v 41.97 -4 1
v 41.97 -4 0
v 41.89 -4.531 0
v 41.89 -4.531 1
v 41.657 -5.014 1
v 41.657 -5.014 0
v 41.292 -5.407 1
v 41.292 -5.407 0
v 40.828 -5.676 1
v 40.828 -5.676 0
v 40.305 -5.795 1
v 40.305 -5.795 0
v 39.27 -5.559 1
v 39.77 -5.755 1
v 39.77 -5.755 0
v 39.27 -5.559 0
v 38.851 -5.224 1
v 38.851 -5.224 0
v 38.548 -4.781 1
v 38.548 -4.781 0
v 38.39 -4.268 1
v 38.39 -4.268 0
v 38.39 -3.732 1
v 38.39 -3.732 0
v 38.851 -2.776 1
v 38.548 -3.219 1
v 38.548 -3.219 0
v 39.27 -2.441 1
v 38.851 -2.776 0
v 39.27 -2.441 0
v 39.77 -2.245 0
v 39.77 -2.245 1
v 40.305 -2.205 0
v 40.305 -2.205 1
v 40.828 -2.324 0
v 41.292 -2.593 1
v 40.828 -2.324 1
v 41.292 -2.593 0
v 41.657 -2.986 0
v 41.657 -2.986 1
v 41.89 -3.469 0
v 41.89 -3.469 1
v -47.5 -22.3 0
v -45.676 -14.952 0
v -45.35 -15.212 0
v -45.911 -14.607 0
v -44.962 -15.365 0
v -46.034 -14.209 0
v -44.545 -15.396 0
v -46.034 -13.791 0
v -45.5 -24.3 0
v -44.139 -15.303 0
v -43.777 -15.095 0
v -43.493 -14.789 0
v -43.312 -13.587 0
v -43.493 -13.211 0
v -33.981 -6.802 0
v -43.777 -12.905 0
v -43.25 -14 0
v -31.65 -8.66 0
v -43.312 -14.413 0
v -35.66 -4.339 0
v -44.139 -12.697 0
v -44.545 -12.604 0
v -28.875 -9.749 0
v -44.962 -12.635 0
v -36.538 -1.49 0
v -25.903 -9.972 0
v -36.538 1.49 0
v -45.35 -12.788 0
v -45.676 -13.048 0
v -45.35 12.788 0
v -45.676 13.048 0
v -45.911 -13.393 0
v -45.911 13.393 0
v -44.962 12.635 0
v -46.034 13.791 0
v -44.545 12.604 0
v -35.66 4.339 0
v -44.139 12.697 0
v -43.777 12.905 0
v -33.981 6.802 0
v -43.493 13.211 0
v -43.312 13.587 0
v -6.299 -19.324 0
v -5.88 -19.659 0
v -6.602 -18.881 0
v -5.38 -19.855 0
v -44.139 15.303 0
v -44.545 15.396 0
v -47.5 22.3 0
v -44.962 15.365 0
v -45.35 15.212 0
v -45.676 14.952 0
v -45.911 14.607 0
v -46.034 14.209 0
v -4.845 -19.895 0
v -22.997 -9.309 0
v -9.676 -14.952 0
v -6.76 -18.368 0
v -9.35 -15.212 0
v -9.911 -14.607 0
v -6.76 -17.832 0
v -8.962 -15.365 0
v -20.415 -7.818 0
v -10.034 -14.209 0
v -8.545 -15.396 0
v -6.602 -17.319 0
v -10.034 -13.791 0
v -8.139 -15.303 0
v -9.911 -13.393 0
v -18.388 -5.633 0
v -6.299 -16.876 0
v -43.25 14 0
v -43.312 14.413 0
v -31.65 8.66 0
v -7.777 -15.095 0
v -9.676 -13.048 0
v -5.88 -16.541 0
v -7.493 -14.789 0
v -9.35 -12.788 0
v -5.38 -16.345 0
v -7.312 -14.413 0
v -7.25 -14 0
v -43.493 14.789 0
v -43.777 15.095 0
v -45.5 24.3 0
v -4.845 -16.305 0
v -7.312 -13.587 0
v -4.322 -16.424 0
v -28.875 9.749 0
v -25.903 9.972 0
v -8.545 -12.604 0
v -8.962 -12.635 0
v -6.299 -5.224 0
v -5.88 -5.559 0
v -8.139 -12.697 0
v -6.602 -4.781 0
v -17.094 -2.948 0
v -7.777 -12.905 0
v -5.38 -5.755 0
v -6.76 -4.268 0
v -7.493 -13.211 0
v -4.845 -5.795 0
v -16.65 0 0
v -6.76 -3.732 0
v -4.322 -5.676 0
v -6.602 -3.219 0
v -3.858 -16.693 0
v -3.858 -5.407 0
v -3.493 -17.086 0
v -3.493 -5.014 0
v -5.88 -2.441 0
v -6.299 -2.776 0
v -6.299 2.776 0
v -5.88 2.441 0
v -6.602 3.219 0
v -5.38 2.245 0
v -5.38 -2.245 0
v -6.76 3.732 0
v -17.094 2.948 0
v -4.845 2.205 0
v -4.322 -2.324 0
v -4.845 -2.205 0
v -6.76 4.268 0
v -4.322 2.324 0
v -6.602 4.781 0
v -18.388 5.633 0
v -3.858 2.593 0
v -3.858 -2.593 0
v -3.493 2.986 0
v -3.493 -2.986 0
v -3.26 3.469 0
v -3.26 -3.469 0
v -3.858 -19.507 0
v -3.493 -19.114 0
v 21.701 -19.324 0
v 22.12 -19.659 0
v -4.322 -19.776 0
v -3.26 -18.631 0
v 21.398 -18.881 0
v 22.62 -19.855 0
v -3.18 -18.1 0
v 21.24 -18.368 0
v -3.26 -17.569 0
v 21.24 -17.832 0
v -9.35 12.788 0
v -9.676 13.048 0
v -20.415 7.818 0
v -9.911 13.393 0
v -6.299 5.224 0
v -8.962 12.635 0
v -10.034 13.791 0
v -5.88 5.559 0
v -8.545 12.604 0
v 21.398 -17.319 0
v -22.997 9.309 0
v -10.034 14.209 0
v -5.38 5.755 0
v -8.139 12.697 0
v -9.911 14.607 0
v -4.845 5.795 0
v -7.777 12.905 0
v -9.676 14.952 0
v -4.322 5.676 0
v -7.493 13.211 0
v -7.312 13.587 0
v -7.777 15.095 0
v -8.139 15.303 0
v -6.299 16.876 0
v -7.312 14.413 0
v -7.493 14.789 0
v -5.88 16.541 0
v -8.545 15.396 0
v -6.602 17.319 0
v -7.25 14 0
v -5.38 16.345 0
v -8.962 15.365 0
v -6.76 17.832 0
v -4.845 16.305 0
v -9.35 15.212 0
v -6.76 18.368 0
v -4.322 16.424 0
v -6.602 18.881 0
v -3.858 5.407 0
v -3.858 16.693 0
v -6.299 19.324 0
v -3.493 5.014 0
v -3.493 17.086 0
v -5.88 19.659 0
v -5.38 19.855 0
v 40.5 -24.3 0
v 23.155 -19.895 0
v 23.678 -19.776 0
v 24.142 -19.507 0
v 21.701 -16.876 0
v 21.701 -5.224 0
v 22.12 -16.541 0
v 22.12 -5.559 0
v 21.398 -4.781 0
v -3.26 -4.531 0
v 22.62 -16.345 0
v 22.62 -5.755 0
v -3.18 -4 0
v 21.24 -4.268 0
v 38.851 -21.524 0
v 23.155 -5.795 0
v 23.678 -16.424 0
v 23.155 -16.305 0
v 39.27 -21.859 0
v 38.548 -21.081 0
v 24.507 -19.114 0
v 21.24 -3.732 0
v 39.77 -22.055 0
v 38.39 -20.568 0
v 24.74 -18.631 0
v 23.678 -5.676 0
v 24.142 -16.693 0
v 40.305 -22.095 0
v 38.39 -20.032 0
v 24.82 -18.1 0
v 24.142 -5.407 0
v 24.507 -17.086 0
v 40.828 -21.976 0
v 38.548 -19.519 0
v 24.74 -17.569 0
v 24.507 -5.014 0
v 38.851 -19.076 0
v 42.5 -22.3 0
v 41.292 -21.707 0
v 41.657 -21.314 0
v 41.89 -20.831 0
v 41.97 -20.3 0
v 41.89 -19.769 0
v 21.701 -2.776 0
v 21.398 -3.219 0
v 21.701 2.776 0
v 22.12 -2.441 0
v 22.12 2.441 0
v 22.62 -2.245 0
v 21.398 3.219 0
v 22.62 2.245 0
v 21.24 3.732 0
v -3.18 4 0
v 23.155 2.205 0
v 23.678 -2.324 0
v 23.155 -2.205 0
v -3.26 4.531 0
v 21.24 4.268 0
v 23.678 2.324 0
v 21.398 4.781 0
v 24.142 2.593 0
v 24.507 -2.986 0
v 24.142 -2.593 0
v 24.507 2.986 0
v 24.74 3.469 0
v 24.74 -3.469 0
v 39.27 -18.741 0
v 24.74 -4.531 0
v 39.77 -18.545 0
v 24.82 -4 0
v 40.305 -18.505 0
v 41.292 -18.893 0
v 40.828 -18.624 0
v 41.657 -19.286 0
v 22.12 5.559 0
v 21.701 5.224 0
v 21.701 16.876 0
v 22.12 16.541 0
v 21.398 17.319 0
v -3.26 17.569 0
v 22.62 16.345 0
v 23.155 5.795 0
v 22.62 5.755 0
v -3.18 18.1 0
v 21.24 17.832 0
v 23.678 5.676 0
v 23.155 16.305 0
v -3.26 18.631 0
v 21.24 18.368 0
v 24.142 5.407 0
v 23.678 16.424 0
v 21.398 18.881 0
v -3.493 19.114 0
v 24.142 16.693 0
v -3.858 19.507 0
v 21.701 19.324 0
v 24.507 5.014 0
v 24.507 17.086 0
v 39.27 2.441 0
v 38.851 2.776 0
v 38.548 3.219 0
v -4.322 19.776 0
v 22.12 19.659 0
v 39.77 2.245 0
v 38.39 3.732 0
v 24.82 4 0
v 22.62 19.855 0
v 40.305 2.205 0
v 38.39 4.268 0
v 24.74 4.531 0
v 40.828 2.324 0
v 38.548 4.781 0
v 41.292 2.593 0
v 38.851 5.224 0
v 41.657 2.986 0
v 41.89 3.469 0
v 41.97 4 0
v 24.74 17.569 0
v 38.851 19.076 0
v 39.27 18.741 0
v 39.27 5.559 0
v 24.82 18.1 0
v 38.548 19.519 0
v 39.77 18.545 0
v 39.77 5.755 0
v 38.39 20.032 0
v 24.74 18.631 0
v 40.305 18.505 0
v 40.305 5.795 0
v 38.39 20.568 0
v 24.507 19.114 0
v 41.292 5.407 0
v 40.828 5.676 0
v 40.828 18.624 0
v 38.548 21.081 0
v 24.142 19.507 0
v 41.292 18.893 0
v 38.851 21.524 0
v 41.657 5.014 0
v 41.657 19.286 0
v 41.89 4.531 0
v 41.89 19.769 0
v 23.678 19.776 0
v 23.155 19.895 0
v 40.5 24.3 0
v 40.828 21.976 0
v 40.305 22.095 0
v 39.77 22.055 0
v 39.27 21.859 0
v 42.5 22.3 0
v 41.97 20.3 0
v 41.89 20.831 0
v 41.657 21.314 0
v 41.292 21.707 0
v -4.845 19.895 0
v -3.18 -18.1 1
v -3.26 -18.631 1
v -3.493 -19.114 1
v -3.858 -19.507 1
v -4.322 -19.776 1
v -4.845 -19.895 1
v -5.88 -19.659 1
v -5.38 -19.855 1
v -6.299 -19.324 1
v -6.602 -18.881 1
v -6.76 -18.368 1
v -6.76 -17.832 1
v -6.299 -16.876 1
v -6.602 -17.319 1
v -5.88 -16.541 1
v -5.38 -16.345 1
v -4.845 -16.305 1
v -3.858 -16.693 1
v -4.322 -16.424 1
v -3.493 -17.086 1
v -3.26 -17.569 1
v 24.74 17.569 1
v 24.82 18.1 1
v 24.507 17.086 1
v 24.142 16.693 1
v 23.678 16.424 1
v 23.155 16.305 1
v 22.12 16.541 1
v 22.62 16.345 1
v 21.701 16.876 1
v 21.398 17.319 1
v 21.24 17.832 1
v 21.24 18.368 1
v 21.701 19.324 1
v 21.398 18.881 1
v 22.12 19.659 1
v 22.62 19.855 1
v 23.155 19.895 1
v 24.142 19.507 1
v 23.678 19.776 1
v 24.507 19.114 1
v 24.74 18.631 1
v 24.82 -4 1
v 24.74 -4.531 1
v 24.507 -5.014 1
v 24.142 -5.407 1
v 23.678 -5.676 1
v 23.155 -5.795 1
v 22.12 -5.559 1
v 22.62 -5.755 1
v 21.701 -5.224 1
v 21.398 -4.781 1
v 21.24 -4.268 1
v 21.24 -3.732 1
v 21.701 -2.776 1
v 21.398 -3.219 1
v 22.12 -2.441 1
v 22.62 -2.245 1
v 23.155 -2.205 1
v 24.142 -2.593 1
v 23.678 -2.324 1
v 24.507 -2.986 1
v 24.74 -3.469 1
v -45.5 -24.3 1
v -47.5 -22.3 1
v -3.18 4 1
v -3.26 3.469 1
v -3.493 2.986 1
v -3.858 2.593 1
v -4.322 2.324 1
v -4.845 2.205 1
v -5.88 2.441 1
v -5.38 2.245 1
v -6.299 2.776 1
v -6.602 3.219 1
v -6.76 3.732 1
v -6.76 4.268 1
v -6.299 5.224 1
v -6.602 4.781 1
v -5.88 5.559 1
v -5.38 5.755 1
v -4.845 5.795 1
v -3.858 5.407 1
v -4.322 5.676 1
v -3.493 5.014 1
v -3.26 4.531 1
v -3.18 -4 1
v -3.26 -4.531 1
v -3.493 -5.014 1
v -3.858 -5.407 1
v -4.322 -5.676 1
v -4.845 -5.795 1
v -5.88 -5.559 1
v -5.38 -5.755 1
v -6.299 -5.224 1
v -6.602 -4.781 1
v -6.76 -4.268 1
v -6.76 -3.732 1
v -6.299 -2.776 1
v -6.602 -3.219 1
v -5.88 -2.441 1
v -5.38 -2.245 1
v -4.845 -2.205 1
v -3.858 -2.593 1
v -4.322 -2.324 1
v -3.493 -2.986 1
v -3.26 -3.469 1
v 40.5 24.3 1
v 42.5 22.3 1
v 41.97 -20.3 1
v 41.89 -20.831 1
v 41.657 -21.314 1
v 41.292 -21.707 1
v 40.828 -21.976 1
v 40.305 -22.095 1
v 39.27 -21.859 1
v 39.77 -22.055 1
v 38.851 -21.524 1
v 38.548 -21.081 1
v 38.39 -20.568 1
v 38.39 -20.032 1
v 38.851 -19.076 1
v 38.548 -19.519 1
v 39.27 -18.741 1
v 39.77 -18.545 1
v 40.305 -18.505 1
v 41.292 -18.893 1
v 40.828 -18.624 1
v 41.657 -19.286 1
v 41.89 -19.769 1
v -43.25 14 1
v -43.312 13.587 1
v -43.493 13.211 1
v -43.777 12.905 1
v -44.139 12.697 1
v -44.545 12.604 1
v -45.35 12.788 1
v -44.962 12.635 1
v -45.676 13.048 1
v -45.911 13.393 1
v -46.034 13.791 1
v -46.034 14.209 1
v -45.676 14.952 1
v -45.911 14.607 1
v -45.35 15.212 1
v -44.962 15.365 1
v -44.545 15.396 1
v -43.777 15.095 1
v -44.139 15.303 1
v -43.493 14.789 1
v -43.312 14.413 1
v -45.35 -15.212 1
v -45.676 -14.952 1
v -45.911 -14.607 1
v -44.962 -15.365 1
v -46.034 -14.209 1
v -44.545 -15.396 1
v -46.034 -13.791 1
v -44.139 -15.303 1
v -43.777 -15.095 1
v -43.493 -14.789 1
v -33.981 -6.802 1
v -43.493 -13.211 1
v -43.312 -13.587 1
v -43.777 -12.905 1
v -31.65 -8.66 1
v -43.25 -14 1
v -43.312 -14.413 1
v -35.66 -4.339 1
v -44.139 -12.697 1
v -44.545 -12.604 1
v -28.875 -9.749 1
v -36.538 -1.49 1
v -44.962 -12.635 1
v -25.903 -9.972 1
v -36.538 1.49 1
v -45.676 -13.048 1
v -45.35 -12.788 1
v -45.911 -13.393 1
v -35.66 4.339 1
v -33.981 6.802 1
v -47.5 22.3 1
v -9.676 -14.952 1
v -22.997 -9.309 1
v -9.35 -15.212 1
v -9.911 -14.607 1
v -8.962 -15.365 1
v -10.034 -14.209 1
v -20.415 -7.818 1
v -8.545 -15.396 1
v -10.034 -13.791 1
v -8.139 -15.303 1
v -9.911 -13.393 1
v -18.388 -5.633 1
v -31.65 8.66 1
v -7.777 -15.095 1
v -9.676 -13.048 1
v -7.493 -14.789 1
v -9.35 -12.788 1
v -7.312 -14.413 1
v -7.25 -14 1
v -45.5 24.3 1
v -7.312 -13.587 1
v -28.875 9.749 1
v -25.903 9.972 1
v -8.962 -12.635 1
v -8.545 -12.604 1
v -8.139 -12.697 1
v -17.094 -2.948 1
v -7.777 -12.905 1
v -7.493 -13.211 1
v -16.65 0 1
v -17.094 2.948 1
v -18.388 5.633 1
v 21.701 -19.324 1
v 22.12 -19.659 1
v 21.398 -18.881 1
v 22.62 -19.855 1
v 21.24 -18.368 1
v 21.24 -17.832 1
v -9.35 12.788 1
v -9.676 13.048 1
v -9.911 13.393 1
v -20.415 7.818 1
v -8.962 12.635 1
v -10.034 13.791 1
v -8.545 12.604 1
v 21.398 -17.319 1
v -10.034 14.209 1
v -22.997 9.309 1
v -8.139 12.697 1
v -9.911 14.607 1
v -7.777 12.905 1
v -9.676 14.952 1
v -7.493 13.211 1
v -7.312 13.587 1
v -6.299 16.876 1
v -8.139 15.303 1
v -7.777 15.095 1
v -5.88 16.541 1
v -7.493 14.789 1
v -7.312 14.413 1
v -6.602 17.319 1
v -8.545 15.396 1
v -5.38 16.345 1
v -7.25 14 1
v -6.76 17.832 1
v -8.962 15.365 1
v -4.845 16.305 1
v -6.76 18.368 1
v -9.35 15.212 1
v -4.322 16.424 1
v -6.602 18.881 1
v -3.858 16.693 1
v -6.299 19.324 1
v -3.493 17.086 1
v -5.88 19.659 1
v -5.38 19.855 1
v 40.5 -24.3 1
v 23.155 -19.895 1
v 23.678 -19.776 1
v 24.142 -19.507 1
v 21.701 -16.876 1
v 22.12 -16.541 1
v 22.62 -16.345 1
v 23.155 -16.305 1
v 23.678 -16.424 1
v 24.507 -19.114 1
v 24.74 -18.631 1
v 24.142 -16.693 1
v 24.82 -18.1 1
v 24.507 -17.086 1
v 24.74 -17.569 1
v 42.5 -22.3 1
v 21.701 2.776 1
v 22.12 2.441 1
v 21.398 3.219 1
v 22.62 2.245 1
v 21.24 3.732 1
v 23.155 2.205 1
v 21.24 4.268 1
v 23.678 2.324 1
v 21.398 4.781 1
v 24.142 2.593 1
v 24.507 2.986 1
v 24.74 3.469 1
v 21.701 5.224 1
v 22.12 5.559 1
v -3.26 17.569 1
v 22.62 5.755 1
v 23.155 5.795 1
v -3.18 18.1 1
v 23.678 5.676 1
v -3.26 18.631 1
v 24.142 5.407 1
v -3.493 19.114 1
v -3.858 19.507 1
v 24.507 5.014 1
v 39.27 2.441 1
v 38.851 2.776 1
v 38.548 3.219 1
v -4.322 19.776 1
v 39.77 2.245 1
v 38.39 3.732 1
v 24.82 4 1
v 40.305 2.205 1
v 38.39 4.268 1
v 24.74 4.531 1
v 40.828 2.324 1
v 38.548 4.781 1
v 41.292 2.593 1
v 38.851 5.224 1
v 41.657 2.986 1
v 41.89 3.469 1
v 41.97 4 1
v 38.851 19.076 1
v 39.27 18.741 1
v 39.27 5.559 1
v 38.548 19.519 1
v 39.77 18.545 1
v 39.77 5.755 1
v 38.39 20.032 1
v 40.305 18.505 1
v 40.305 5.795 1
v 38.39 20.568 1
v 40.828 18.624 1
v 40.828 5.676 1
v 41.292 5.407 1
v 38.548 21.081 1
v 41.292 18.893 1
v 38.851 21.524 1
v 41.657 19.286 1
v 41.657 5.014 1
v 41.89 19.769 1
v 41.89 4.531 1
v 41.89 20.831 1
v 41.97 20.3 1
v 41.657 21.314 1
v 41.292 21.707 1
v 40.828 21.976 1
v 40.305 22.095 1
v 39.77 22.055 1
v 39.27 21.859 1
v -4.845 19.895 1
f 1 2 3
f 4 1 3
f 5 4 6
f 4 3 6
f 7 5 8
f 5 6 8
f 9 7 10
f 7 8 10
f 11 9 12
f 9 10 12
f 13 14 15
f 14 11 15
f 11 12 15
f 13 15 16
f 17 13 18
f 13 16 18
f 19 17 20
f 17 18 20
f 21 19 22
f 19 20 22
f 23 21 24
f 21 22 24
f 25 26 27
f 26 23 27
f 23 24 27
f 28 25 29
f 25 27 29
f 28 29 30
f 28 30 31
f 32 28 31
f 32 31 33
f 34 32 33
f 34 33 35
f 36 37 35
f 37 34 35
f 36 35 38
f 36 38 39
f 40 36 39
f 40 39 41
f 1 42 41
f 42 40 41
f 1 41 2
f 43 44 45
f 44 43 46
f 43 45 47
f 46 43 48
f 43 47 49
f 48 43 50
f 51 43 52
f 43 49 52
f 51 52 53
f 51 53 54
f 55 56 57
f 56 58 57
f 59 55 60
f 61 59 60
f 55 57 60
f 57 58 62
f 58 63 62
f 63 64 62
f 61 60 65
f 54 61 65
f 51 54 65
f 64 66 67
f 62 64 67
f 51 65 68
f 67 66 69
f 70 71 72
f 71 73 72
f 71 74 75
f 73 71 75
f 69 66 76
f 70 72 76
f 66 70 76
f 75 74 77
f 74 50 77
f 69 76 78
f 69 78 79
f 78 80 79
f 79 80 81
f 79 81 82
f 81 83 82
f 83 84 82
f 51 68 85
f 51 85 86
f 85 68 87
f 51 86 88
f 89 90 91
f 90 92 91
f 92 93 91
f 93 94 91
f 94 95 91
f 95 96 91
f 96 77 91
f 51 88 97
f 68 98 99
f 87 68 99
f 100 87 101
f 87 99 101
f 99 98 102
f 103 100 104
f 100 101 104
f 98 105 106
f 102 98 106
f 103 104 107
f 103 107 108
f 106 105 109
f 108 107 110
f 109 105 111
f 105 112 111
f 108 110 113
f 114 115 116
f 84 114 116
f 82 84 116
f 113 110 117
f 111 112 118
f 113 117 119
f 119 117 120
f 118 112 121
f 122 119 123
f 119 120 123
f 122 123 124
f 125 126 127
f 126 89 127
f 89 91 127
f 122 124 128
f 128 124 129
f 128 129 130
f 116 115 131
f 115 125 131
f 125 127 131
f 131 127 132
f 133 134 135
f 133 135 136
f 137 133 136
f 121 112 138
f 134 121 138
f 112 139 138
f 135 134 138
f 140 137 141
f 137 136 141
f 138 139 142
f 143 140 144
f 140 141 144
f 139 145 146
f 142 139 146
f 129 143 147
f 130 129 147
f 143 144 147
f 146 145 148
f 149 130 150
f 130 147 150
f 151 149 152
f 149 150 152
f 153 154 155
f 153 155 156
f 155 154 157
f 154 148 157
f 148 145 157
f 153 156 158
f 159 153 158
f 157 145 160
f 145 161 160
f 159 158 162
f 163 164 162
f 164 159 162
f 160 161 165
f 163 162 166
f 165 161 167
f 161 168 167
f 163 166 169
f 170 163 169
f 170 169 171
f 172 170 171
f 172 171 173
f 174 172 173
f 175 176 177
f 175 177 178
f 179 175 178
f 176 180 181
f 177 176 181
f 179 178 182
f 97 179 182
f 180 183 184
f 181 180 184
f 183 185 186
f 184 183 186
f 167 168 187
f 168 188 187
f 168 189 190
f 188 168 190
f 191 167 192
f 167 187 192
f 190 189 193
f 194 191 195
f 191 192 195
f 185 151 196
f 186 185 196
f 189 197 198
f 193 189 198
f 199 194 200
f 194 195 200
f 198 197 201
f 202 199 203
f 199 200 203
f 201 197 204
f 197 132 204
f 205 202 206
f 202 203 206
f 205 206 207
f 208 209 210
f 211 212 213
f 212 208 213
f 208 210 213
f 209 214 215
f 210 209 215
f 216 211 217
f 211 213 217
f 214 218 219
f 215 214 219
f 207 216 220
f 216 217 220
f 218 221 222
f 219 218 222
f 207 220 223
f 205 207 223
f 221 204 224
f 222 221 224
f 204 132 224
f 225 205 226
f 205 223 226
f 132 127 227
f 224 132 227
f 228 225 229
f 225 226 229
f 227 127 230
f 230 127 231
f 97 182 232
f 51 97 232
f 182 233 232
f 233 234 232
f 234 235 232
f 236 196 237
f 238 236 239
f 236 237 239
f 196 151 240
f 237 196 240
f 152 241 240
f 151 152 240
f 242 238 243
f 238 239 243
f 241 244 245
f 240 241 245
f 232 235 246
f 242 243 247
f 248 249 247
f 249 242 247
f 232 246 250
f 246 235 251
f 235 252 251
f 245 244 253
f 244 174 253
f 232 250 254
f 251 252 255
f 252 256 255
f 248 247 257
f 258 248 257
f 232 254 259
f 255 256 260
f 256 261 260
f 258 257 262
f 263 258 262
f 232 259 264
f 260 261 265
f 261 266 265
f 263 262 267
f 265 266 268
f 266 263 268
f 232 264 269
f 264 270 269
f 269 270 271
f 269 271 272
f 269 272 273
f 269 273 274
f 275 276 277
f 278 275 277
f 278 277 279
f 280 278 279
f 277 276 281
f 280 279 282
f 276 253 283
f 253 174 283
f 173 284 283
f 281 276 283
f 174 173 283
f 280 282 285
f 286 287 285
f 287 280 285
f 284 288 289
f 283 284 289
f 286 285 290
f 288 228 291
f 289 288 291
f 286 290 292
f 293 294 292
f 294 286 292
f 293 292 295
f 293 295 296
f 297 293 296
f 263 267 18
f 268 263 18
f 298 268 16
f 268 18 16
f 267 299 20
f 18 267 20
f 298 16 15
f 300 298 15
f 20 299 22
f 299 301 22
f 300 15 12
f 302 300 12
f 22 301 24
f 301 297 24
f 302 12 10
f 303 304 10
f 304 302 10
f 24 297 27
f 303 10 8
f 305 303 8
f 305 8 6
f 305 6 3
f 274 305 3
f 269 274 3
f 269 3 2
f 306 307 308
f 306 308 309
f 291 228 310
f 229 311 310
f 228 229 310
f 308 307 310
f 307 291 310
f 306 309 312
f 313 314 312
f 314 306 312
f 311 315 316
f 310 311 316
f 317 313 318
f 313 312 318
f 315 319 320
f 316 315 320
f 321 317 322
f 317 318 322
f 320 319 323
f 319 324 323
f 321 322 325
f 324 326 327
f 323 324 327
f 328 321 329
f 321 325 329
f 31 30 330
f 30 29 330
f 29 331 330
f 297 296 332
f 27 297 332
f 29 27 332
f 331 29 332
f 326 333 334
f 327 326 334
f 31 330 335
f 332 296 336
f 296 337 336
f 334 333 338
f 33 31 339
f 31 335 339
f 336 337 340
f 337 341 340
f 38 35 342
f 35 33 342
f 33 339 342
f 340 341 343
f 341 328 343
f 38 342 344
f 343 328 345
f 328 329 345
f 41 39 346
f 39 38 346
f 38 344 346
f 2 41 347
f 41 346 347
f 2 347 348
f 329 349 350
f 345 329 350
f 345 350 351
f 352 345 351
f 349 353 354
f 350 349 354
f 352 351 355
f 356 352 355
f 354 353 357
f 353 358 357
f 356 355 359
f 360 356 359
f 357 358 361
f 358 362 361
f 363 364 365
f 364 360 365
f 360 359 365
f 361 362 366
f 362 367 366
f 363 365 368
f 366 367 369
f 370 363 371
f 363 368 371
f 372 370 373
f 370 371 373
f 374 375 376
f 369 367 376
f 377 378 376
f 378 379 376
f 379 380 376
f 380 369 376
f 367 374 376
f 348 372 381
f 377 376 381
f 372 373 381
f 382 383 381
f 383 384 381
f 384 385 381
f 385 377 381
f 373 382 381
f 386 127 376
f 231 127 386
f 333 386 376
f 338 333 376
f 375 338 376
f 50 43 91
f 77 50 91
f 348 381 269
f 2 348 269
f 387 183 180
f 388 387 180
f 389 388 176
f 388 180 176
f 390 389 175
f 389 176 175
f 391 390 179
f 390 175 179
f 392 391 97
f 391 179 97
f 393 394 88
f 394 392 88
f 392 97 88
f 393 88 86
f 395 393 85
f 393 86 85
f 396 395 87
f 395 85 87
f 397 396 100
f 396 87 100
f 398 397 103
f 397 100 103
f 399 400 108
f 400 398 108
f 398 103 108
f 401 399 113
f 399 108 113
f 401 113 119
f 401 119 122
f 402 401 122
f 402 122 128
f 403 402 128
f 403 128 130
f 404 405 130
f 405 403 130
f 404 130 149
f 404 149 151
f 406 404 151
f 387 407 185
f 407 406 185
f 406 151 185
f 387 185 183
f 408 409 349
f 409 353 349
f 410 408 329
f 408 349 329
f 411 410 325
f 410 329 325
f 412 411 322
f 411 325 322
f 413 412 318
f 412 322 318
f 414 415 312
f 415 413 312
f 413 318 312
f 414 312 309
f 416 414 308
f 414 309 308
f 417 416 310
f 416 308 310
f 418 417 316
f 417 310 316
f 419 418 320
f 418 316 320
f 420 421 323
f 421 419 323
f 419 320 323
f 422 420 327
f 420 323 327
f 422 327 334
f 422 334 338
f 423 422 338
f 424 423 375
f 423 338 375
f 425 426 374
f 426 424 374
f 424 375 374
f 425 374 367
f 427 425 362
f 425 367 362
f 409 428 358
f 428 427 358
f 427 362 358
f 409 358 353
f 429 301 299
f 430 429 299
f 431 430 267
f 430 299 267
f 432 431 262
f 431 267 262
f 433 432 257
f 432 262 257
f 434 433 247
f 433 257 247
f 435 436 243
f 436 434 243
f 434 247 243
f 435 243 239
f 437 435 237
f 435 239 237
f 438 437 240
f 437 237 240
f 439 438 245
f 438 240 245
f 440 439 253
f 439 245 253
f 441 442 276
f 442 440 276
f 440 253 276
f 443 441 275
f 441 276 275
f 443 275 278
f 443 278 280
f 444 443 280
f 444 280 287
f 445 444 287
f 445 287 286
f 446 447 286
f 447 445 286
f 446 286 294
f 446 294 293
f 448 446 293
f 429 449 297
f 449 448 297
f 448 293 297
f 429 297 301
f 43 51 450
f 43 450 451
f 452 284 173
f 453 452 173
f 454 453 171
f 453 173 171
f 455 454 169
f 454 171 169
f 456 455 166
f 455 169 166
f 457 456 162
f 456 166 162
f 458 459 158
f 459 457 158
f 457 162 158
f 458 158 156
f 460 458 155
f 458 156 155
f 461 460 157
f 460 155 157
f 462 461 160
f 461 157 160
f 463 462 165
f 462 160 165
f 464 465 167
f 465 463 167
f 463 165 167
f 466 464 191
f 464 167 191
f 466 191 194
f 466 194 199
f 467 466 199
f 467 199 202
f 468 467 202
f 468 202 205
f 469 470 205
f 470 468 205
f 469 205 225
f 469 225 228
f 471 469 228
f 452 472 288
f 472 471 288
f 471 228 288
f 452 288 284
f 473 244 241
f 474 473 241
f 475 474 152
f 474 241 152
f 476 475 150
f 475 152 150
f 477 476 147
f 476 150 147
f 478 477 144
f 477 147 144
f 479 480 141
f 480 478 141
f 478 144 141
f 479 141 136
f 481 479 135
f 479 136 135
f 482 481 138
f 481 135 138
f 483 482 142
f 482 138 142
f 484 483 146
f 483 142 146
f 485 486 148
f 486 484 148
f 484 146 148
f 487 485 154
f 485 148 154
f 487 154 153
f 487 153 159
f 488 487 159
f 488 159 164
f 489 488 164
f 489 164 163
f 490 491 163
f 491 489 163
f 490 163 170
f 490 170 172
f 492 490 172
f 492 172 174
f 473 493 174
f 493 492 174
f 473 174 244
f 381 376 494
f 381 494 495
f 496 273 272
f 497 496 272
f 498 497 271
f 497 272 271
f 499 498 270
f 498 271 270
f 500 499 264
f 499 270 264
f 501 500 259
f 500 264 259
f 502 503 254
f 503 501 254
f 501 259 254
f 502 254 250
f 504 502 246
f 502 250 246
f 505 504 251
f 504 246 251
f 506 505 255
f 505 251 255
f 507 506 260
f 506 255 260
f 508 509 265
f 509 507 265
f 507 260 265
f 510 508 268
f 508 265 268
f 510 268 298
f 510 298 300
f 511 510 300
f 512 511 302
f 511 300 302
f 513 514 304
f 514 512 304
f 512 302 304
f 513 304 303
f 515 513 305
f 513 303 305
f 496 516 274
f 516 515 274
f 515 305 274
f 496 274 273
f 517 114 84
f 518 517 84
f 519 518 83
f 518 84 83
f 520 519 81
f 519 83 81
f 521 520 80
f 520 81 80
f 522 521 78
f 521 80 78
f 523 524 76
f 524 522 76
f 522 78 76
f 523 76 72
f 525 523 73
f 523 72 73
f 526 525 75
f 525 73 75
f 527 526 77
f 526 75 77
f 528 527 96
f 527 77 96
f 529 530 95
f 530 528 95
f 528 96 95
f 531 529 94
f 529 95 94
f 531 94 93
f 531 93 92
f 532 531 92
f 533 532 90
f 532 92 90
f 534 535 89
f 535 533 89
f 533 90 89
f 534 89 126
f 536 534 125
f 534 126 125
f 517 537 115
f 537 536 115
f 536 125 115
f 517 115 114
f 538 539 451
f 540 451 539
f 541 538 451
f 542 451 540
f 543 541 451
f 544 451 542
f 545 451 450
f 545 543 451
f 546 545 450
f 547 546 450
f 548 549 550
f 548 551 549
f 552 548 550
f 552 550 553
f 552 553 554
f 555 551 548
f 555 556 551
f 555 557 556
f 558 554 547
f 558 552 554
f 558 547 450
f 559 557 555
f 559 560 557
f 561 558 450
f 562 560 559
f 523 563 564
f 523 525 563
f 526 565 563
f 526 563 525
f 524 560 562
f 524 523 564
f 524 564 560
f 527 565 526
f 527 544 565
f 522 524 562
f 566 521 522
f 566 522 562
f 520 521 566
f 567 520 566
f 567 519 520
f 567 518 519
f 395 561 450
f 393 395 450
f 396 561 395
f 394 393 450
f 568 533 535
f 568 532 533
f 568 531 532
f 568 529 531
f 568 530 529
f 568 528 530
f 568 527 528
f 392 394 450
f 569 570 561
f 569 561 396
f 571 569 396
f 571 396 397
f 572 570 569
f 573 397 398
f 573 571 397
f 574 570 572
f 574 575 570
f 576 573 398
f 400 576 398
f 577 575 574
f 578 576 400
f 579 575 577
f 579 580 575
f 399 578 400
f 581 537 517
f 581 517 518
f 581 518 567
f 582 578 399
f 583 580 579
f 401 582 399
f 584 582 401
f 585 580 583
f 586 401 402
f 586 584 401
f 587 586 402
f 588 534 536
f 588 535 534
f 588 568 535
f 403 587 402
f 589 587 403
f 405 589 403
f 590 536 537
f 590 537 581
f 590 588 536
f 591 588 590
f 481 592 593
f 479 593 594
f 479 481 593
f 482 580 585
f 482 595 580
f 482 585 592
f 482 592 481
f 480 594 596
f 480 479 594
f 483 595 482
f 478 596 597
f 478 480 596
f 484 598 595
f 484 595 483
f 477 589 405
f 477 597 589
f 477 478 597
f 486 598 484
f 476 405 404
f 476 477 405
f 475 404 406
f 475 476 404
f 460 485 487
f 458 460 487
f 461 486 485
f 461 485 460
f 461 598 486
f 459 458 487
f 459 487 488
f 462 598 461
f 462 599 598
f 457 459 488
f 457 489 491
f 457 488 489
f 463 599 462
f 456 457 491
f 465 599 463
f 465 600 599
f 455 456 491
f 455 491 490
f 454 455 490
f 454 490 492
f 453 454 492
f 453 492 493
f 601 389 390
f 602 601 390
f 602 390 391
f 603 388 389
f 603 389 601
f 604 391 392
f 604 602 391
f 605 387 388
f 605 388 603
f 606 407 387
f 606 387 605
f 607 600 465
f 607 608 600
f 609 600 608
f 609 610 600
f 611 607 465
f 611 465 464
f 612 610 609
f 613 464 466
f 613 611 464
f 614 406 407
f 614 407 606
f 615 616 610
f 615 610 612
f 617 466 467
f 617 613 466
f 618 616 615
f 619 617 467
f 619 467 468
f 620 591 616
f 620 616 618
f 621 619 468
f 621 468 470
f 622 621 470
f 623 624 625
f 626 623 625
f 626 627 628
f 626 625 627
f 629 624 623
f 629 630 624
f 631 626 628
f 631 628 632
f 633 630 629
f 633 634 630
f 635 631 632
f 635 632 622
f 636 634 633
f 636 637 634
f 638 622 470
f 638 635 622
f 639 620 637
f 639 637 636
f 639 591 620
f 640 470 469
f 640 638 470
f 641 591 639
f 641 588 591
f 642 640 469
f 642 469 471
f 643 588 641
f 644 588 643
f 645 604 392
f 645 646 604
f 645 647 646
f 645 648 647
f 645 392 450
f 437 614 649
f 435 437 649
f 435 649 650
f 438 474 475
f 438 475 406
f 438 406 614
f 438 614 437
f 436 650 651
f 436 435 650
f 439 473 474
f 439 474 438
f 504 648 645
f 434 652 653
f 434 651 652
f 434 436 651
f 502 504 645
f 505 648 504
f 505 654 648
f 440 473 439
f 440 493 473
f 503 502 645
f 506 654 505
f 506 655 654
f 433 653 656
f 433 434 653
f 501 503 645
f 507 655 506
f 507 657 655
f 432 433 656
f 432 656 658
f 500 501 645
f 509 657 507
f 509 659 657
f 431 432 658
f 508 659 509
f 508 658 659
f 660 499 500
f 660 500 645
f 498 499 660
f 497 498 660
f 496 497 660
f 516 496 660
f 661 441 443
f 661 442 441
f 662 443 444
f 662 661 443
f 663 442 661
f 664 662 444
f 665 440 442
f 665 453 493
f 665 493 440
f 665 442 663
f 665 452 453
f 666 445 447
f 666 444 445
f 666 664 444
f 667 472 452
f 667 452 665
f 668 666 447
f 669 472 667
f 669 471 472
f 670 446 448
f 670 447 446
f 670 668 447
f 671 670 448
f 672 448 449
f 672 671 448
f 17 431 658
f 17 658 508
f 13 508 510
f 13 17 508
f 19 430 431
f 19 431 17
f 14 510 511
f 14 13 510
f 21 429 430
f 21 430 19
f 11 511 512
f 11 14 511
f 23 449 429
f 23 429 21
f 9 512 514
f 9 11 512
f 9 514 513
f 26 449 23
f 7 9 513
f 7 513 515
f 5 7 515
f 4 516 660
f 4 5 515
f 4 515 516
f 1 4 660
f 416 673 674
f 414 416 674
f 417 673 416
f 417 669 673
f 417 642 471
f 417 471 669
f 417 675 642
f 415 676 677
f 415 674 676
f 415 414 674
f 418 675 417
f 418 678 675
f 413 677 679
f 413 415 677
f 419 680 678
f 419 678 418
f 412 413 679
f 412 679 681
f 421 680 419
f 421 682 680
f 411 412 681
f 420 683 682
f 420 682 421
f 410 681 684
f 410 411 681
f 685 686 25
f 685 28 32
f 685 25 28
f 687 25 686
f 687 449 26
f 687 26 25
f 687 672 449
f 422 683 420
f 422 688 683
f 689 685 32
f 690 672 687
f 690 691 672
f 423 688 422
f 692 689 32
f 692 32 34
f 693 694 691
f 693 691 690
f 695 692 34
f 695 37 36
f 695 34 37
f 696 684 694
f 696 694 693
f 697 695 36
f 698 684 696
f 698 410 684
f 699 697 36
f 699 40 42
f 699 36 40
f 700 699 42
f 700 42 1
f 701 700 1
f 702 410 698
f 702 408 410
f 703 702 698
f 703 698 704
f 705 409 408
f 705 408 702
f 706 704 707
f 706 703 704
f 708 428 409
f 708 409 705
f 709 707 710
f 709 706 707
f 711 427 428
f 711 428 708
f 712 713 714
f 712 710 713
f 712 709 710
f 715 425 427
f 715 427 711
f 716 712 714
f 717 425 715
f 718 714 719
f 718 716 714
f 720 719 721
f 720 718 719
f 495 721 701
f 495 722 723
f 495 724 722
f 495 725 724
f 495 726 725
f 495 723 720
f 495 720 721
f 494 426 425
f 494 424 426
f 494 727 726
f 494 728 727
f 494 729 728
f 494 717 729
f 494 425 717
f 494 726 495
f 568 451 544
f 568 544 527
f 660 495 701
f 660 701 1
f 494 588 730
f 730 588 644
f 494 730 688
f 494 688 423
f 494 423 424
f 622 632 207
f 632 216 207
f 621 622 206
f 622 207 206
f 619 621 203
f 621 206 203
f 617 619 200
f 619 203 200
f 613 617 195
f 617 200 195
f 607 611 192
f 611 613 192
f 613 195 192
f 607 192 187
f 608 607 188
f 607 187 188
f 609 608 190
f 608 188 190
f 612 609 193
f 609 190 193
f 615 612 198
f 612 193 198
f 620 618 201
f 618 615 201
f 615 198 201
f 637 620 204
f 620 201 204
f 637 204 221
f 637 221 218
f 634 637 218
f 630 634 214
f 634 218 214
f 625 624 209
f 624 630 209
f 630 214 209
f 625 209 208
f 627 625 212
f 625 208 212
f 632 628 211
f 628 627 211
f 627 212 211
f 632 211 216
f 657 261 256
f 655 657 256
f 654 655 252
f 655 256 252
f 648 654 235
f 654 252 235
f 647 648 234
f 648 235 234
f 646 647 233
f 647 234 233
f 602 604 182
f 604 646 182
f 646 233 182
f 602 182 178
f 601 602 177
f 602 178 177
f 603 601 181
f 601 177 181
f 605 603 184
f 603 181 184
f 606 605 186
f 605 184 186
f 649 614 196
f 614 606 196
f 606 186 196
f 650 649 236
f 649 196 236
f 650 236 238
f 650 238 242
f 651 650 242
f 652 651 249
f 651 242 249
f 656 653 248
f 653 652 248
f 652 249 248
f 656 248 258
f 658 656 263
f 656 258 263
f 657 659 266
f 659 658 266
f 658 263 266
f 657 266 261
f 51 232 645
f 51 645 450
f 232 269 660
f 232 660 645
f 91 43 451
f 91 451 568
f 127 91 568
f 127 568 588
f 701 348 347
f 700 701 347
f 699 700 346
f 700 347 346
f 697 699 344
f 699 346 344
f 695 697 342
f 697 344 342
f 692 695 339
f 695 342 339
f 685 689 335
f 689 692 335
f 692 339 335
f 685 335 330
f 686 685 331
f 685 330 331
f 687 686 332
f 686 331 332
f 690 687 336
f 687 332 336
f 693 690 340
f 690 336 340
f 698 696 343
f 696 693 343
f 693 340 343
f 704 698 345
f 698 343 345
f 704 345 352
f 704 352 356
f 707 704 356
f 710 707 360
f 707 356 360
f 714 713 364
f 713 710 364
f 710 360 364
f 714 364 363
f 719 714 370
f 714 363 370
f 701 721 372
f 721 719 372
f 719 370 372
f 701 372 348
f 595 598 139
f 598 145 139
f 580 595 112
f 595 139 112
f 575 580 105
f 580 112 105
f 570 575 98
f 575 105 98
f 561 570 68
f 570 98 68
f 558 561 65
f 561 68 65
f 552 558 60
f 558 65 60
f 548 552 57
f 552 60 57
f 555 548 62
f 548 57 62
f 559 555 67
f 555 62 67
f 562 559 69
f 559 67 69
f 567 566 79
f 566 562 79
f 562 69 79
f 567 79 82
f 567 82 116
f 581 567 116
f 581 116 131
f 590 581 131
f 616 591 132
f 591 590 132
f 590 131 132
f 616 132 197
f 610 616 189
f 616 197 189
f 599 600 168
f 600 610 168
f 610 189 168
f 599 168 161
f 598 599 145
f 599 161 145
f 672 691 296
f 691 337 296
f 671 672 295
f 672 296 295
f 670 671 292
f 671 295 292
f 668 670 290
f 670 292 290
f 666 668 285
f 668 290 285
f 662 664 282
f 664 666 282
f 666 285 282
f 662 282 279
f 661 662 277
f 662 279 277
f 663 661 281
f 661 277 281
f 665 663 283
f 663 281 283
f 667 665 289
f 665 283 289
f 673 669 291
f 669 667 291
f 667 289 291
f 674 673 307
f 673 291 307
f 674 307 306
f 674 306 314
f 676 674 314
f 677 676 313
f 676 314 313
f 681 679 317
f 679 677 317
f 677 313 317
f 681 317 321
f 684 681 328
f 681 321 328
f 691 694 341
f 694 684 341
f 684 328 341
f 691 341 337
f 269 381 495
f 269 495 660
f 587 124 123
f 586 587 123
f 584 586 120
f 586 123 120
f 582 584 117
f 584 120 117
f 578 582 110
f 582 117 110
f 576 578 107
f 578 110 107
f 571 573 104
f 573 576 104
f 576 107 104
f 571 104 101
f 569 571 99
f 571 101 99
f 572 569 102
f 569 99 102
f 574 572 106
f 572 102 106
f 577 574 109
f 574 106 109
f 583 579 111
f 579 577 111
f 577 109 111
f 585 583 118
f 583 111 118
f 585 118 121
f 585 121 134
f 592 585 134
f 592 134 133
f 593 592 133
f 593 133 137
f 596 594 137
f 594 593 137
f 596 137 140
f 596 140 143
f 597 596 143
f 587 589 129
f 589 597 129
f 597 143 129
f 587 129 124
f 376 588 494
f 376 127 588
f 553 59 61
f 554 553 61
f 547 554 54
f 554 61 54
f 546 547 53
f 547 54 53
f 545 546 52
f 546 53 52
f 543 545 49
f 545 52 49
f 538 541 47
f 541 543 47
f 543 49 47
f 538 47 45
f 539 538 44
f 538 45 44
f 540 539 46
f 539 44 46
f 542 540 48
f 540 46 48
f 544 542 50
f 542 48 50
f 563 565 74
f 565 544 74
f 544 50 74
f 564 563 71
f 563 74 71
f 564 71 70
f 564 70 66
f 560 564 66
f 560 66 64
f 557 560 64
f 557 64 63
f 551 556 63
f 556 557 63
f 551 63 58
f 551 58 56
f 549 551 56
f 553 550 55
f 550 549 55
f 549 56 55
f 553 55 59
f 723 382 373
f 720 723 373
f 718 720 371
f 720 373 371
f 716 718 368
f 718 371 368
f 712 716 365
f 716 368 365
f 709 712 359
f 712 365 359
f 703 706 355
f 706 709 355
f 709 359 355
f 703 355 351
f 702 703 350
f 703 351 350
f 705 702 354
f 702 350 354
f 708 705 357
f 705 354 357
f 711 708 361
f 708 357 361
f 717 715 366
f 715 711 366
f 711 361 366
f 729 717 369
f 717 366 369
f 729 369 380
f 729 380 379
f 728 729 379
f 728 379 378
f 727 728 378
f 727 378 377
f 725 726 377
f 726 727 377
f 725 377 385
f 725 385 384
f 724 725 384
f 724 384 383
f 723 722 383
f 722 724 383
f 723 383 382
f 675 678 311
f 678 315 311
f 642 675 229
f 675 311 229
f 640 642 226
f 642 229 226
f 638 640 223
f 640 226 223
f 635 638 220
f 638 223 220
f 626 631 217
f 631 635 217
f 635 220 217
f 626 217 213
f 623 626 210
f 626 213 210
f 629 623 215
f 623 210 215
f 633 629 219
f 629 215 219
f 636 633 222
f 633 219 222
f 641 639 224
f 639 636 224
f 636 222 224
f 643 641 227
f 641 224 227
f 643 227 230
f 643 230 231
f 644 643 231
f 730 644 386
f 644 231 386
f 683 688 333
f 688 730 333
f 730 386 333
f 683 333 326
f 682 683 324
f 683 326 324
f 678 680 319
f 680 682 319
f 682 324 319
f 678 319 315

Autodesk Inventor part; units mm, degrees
ref_plane "YZ Plane" through (0, 0, 0) normal (1, 0, 0) x (0, 1, 0)
ref_plane "XZ Plane" through (0, 0, 0) normal (0, 1, 0) x (-1, 0, 0)
ref_plane "XY Plane" through (0, 0, 0) normal (0, 0, 1) x (1, 0, 0)
ref_plane "Arbeitsebene1" through (0, 0, 0) normal (0, 0, 1) x (1, 0, 0)
sketch "Skizze1" plane through (0, 0, 0) normal (0, 0, 1) x (1, 0, 0)
  circle A0 centre (-44.65, -14) radius 1.4 projected
  circle A1 centre (-44.65, 14) radius 1.4 projected
  circle A2 centre (-8.65, -14) radius 1.4 projected
  circle A3 centre (-8.65, 14) radius 1.4 projected
  circle A4 centre (23.0201, 18.1) radius 1.8 projected
  circle A5 centre (-4.9799, 18.1) radius 1.8 projected
  circle A6 centre (-4.9799, 4) radius 1.8 projected
  circle A7 centre (-4.9799, -4) radius 1.8 projected
  circle A8 centre (-4.9799, -18.1) radius 1.8 projected
  circle A9 centre (23.0201, -18.1) radius 1.8 projected
  circle A10 centre (23.0201, 4) radius 1.8 projected
  circle A11 centre (23.0201, -4) radius 1.8 projected
  circle A12 centre (40.1702, -4) radius 1.8 projected
  circle A13 centre (40.1702, -20.3) radius 1.8 projected
  circle A14 centre (40.1702, 4) radius 1.8 projected
  circle A15 centre (40.1702, 20.3) radius 1.8 projected
  line L0 (-45.5, -24.3) -> (-47.5, -22.3) projected
  line L1 (40.5, -24.3) -> (-45.5, -24.3) projected
  line L2 (42.5, -22.3) -> (40.5, -24.3) projected
  line L3 (42.5, 22.3) -> (42.5, -22.3) projected
  line L4 (40.5, 24.3) -> (42.5, 22.3) projected
  line L5 (-45.5, 24.3) -> (40.5, 24.3) projected
  line L6 (-47.5, 22.3) -> (-45.5, 24.3) projected
  line L7 (-47.5, -22.3) -> (-47.5, 22.3) projected
  circle A16 centre (-26.65, 0) radius 10 projected
  point P0 (0, 0)
extrude "Extrusion1" add sketch "Skizze1" along normal blind 1
properties part number "60_Planktoscope_Sampleholder_spacer"
